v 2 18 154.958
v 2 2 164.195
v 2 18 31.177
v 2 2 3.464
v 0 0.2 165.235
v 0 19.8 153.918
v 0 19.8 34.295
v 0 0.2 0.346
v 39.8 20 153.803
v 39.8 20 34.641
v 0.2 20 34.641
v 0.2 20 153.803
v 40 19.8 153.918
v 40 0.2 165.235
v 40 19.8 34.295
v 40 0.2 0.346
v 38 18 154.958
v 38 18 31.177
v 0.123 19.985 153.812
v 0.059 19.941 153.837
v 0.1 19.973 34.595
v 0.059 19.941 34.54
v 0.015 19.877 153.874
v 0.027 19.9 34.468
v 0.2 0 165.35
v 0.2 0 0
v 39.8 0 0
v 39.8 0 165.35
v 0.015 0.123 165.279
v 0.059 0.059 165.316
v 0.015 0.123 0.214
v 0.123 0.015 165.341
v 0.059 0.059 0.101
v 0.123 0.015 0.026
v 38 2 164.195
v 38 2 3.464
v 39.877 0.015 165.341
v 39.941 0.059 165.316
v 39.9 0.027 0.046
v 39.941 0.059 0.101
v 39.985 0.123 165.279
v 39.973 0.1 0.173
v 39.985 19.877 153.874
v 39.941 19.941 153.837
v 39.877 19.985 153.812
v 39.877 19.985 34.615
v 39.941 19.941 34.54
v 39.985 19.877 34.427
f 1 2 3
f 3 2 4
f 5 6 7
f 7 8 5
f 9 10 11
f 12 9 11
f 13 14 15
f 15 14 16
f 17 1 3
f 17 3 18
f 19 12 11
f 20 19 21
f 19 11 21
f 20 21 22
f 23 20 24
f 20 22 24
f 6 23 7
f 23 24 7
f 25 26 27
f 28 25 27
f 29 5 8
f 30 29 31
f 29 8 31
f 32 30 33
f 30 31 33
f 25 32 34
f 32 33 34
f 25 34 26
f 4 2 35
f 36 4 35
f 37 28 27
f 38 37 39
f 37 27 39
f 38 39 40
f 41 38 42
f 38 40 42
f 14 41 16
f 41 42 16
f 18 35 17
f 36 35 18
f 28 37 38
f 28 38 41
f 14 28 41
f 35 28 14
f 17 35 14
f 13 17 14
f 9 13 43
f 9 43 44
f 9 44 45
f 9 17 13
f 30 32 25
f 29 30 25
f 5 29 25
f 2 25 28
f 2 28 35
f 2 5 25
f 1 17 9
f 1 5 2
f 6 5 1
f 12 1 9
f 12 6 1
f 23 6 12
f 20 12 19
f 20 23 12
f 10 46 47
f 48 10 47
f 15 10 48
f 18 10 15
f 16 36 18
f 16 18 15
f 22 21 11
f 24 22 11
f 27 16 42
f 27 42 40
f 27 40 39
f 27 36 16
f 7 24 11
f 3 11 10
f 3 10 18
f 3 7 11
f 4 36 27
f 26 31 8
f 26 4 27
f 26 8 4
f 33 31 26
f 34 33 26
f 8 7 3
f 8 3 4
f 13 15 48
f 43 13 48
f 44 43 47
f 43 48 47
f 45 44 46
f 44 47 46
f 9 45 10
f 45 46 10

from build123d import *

# Parameters (mm, degrees)
SKETCH1_W           = 36
SKETCH1_H           = 16
BOSS_EXTRUDE1_DEPTH = 165.35
SKEW_CUT_DEPTH      = 172.291046176


with BuildPart() as part:
    # Sketch1 → Boss-Extrude1 (new body)
    with BuildSketch(Plane.XY):
        with BuildLine():
            Line((0.2, 0), (39.8, 0))
            ThreePointArc((39.8, 0), (39.941421356, 0.058578644), (40, 0.2))
            Line((40, 0.2), (40, 19.8))
            ThreePointArc((40, 19.8), (39.941421356, 19.941421356), (39.8, 20))
            Line((39.8, 20), (0.2, 20))
            ThreePointArc((0.2, 20), (0.058578644, 19.941421356), (0, 19.8))
            Line((0, 19.8), (0, 0.2))
            ThreePointArc((0, 0.2), (0.058578644, 0.058578644), (0.2, 0))
        make_face()
        with Locations((20, 10)):
            Rectangle(SKETCH1_W, SKETCH1_H, mode=Mode.SUBTRACT)
    extrude(amount=BOSS_EXTRUDE1_DEPTH)

    # Sketch2 → Skew Cut (cut, through all)
    with BuildSketch(Plane.ZY):
        Polygon((0, 20), (34.641016151, 20), (0, 0), align=None)
        Polygon((165.35, 0), (153.802994616, 20), (165.35, 20), align=None)
    extrude(amount=-SKEW_CUT_DEPTH, mode=Mode.SUBTRACT)


solid = part.part
